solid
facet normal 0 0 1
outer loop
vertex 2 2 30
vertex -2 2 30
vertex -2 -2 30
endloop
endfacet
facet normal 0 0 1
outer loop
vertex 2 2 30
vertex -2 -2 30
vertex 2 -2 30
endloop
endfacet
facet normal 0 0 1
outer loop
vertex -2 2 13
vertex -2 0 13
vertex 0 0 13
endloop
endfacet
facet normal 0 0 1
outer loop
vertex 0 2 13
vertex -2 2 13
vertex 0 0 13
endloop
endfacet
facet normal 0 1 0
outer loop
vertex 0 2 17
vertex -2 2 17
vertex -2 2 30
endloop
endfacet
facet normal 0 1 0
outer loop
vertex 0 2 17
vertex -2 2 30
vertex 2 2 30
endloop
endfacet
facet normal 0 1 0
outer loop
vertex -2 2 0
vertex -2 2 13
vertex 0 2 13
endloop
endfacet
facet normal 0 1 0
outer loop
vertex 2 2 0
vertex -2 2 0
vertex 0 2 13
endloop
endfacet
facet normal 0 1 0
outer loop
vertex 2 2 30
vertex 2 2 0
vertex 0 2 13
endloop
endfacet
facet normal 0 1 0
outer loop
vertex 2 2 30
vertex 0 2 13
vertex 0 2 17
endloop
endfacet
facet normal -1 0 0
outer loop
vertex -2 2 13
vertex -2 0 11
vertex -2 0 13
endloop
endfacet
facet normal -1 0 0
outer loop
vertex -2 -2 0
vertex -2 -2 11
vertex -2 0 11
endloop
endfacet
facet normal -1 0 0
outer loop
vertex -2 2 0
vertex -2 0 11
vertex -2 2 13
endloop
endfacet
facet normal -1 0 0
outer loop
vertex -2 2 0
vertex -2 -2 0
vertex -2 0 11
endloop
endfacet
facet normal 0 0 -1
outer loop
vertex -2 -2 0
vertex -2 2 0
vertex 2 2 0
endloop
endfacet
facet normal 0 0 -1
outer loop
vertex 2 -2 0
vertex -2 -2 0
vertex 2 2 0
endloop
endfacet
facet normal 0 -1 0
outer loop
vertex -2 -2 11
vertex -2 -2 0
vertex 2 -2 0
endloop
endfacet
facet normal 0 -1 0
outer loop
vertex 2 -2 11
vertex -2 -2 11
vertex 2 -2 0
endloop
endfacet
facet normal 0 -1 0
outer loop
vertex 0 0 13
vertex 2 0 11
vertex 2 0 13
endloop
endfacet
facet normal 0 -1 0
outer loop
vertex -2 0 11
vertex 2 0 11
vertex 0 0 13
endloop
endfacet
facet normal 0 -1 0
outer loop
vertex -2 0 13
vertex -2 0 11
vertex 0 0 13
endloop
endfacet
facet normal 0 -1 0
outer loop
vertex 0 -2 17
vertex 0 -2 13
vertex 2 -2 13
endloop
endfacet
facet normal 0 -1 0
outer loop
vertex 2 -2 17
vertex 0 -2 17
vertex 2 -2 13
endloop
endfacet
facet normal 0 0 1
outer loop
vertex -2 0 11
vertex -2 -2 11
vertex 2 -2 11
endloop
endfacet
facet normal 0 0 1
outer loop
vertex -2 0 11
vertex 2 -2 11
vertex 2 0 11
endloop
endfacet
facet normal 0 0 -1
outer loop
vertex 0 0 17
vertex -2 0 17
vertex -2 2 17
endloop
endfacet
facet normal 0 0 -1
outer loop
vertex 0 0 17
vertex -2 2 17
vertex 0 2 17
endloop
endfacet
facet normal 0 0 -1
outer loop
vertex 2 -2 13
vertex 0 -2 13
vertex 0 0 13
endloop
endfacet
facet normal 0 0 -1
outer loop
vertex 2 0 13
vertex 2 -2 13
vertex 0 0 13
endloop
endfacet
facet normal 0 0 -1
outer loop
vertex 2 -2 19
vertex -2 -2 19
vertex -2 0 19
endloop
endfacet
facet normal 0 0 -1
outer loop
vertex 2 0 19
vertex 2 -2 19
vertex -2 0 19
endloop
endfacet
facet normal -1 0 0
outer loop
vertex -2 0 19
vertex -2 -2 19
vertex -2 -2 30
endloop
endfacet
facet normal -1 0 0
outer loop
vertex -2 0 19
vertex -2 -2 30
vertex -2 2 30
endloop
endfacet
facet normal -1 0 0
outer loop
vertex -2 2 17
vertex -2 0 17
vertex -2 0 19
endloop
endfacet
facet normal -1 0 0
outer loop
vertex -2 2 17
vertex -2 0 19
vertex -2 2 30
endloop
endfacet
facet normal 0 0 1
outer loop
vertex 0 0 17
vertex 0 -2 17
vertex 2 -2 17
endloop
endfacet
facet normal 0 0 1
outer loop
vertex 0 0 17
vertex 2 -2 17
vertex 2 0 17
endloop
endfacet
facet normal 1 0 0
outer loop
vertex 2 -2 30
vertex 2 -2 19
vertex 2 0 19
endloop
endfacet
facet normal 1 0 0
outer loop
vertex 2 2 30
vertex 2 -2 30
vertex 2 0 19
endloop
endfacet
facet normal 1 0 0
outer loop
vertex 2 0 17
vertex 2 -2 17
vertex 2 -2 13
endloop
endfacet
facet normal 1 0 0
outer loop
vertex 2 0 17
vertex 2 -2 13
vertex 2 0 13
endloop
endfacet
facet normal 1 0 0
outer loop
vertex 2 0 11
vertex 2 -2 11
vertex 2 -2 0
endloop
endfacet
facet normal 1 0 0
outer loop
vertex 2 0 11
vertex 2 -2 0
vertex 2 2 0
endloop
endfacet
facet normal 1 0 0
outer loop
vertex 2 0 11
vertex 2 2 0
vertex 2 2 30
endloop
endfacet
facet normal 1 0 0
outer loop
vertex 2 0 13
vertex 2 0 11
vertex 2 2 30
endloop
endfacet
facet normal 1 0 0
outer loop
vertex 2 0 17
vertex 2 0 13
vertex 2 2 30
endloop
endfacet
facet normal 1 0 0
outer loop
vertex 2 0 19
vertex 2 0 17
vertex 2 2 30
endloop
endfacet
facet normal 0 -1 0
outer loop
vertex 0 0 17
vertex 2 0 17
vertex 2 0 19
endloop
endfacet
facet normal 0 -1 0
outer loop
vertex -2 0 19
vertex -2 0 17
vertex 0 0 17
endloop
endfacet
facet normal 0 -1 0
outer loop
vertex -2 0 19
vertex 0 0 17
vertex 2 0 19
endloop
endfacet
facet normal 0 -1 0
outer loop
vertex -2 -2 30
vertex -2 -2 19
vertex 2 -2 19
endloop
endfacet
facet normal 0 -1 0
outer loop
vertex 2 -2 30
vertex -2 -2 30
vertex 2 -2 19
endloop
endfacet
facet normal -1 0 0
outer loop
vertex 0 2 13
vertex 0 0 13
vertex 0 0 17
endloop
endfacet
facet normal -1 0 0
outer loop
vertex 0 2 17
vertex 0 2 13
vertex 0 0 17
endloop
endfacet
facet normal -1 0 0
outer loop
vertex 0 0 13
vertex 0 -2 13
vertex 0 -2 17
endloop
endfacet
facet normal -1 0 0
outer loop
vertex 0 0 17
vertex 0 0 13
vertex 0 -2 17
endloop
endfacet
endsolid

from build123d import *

# Parameters (mm, degrees)
SKETCH_1_W          = 4
SKETCH_1_H          = 4
EXTRUDE_1_DEPTH     = 30
SKETCH_3_W          = 8
SKETCH_3_H          = 2
CUT_EXTRUDE_1_DEPTH = 2
SKETCH_5_W          = 2
SKETCH_5_H          = 2
CUT_EXTRUDE_2_DEPTH = 2
SKETCH_6_W          = 2
SKETCH_6_H          = 2
CUT_EXTRUDE_3_DEPTH = 2
SKETCH_8_W          = 2
SKETCH_8_H          = 4
CUT_EXTRUDE_4_DEPTH = 2


with BuildPart() as part:
    # 草圖1 → 填料-伸長1 (new body)
    with BuildSketch(Plane.XY):
        Rectangle(SKETCH_1_W, SKETCH_1_H)
    extrude(amount=EXTRUDE_1_DEPTH)

    # 草圖3 → 除料-伸長1 (cut)
    with BuildSketch(Plane.ZY.offset(2)):
        with Locations((15, -1)):
            Rectangle(SKETCH_3_W, SKETCH_3_H)
    extrude(amount=-CUT_EXTRUDE_1_DEPTH, mode=Mode.SUBTRACT)

    # 草圖5 → 除料-伸長2 (cut)
    with BuildSketch(Plane.ZY):
        with Locations((18, -1)):
            Rectangle(SKETCH_5_W, SKETCH_5_H)
    extrude(amount=-CUT_EXTRUDE_2_DEPTH, mode=Mode.SUBTRACT)

    # 草圖6 → 除料-伸長3 (cut)
    with BuildSketch(Plane.ZY):
        with Locations((12, -1)):
            Rectangle(SKETCH_6_W, SKETCH_6_H)
    extrude(amount=-CUT_EXTRUDE_3_DEPTH, mode=Mode.SUBTRACT)

    # 草圖8 → 除料-伸長4 (cut)
    with BuildSketch(Plane.XZ):
        with Locations((-1, 15)):
            Rectangle(SKETCH_8_W, SKETCH_8_H)
    extrude(amount=-CUT_EXTRUDE_4_DEPTH, mode=Mode.SUBTRACT)


solid = part.part
